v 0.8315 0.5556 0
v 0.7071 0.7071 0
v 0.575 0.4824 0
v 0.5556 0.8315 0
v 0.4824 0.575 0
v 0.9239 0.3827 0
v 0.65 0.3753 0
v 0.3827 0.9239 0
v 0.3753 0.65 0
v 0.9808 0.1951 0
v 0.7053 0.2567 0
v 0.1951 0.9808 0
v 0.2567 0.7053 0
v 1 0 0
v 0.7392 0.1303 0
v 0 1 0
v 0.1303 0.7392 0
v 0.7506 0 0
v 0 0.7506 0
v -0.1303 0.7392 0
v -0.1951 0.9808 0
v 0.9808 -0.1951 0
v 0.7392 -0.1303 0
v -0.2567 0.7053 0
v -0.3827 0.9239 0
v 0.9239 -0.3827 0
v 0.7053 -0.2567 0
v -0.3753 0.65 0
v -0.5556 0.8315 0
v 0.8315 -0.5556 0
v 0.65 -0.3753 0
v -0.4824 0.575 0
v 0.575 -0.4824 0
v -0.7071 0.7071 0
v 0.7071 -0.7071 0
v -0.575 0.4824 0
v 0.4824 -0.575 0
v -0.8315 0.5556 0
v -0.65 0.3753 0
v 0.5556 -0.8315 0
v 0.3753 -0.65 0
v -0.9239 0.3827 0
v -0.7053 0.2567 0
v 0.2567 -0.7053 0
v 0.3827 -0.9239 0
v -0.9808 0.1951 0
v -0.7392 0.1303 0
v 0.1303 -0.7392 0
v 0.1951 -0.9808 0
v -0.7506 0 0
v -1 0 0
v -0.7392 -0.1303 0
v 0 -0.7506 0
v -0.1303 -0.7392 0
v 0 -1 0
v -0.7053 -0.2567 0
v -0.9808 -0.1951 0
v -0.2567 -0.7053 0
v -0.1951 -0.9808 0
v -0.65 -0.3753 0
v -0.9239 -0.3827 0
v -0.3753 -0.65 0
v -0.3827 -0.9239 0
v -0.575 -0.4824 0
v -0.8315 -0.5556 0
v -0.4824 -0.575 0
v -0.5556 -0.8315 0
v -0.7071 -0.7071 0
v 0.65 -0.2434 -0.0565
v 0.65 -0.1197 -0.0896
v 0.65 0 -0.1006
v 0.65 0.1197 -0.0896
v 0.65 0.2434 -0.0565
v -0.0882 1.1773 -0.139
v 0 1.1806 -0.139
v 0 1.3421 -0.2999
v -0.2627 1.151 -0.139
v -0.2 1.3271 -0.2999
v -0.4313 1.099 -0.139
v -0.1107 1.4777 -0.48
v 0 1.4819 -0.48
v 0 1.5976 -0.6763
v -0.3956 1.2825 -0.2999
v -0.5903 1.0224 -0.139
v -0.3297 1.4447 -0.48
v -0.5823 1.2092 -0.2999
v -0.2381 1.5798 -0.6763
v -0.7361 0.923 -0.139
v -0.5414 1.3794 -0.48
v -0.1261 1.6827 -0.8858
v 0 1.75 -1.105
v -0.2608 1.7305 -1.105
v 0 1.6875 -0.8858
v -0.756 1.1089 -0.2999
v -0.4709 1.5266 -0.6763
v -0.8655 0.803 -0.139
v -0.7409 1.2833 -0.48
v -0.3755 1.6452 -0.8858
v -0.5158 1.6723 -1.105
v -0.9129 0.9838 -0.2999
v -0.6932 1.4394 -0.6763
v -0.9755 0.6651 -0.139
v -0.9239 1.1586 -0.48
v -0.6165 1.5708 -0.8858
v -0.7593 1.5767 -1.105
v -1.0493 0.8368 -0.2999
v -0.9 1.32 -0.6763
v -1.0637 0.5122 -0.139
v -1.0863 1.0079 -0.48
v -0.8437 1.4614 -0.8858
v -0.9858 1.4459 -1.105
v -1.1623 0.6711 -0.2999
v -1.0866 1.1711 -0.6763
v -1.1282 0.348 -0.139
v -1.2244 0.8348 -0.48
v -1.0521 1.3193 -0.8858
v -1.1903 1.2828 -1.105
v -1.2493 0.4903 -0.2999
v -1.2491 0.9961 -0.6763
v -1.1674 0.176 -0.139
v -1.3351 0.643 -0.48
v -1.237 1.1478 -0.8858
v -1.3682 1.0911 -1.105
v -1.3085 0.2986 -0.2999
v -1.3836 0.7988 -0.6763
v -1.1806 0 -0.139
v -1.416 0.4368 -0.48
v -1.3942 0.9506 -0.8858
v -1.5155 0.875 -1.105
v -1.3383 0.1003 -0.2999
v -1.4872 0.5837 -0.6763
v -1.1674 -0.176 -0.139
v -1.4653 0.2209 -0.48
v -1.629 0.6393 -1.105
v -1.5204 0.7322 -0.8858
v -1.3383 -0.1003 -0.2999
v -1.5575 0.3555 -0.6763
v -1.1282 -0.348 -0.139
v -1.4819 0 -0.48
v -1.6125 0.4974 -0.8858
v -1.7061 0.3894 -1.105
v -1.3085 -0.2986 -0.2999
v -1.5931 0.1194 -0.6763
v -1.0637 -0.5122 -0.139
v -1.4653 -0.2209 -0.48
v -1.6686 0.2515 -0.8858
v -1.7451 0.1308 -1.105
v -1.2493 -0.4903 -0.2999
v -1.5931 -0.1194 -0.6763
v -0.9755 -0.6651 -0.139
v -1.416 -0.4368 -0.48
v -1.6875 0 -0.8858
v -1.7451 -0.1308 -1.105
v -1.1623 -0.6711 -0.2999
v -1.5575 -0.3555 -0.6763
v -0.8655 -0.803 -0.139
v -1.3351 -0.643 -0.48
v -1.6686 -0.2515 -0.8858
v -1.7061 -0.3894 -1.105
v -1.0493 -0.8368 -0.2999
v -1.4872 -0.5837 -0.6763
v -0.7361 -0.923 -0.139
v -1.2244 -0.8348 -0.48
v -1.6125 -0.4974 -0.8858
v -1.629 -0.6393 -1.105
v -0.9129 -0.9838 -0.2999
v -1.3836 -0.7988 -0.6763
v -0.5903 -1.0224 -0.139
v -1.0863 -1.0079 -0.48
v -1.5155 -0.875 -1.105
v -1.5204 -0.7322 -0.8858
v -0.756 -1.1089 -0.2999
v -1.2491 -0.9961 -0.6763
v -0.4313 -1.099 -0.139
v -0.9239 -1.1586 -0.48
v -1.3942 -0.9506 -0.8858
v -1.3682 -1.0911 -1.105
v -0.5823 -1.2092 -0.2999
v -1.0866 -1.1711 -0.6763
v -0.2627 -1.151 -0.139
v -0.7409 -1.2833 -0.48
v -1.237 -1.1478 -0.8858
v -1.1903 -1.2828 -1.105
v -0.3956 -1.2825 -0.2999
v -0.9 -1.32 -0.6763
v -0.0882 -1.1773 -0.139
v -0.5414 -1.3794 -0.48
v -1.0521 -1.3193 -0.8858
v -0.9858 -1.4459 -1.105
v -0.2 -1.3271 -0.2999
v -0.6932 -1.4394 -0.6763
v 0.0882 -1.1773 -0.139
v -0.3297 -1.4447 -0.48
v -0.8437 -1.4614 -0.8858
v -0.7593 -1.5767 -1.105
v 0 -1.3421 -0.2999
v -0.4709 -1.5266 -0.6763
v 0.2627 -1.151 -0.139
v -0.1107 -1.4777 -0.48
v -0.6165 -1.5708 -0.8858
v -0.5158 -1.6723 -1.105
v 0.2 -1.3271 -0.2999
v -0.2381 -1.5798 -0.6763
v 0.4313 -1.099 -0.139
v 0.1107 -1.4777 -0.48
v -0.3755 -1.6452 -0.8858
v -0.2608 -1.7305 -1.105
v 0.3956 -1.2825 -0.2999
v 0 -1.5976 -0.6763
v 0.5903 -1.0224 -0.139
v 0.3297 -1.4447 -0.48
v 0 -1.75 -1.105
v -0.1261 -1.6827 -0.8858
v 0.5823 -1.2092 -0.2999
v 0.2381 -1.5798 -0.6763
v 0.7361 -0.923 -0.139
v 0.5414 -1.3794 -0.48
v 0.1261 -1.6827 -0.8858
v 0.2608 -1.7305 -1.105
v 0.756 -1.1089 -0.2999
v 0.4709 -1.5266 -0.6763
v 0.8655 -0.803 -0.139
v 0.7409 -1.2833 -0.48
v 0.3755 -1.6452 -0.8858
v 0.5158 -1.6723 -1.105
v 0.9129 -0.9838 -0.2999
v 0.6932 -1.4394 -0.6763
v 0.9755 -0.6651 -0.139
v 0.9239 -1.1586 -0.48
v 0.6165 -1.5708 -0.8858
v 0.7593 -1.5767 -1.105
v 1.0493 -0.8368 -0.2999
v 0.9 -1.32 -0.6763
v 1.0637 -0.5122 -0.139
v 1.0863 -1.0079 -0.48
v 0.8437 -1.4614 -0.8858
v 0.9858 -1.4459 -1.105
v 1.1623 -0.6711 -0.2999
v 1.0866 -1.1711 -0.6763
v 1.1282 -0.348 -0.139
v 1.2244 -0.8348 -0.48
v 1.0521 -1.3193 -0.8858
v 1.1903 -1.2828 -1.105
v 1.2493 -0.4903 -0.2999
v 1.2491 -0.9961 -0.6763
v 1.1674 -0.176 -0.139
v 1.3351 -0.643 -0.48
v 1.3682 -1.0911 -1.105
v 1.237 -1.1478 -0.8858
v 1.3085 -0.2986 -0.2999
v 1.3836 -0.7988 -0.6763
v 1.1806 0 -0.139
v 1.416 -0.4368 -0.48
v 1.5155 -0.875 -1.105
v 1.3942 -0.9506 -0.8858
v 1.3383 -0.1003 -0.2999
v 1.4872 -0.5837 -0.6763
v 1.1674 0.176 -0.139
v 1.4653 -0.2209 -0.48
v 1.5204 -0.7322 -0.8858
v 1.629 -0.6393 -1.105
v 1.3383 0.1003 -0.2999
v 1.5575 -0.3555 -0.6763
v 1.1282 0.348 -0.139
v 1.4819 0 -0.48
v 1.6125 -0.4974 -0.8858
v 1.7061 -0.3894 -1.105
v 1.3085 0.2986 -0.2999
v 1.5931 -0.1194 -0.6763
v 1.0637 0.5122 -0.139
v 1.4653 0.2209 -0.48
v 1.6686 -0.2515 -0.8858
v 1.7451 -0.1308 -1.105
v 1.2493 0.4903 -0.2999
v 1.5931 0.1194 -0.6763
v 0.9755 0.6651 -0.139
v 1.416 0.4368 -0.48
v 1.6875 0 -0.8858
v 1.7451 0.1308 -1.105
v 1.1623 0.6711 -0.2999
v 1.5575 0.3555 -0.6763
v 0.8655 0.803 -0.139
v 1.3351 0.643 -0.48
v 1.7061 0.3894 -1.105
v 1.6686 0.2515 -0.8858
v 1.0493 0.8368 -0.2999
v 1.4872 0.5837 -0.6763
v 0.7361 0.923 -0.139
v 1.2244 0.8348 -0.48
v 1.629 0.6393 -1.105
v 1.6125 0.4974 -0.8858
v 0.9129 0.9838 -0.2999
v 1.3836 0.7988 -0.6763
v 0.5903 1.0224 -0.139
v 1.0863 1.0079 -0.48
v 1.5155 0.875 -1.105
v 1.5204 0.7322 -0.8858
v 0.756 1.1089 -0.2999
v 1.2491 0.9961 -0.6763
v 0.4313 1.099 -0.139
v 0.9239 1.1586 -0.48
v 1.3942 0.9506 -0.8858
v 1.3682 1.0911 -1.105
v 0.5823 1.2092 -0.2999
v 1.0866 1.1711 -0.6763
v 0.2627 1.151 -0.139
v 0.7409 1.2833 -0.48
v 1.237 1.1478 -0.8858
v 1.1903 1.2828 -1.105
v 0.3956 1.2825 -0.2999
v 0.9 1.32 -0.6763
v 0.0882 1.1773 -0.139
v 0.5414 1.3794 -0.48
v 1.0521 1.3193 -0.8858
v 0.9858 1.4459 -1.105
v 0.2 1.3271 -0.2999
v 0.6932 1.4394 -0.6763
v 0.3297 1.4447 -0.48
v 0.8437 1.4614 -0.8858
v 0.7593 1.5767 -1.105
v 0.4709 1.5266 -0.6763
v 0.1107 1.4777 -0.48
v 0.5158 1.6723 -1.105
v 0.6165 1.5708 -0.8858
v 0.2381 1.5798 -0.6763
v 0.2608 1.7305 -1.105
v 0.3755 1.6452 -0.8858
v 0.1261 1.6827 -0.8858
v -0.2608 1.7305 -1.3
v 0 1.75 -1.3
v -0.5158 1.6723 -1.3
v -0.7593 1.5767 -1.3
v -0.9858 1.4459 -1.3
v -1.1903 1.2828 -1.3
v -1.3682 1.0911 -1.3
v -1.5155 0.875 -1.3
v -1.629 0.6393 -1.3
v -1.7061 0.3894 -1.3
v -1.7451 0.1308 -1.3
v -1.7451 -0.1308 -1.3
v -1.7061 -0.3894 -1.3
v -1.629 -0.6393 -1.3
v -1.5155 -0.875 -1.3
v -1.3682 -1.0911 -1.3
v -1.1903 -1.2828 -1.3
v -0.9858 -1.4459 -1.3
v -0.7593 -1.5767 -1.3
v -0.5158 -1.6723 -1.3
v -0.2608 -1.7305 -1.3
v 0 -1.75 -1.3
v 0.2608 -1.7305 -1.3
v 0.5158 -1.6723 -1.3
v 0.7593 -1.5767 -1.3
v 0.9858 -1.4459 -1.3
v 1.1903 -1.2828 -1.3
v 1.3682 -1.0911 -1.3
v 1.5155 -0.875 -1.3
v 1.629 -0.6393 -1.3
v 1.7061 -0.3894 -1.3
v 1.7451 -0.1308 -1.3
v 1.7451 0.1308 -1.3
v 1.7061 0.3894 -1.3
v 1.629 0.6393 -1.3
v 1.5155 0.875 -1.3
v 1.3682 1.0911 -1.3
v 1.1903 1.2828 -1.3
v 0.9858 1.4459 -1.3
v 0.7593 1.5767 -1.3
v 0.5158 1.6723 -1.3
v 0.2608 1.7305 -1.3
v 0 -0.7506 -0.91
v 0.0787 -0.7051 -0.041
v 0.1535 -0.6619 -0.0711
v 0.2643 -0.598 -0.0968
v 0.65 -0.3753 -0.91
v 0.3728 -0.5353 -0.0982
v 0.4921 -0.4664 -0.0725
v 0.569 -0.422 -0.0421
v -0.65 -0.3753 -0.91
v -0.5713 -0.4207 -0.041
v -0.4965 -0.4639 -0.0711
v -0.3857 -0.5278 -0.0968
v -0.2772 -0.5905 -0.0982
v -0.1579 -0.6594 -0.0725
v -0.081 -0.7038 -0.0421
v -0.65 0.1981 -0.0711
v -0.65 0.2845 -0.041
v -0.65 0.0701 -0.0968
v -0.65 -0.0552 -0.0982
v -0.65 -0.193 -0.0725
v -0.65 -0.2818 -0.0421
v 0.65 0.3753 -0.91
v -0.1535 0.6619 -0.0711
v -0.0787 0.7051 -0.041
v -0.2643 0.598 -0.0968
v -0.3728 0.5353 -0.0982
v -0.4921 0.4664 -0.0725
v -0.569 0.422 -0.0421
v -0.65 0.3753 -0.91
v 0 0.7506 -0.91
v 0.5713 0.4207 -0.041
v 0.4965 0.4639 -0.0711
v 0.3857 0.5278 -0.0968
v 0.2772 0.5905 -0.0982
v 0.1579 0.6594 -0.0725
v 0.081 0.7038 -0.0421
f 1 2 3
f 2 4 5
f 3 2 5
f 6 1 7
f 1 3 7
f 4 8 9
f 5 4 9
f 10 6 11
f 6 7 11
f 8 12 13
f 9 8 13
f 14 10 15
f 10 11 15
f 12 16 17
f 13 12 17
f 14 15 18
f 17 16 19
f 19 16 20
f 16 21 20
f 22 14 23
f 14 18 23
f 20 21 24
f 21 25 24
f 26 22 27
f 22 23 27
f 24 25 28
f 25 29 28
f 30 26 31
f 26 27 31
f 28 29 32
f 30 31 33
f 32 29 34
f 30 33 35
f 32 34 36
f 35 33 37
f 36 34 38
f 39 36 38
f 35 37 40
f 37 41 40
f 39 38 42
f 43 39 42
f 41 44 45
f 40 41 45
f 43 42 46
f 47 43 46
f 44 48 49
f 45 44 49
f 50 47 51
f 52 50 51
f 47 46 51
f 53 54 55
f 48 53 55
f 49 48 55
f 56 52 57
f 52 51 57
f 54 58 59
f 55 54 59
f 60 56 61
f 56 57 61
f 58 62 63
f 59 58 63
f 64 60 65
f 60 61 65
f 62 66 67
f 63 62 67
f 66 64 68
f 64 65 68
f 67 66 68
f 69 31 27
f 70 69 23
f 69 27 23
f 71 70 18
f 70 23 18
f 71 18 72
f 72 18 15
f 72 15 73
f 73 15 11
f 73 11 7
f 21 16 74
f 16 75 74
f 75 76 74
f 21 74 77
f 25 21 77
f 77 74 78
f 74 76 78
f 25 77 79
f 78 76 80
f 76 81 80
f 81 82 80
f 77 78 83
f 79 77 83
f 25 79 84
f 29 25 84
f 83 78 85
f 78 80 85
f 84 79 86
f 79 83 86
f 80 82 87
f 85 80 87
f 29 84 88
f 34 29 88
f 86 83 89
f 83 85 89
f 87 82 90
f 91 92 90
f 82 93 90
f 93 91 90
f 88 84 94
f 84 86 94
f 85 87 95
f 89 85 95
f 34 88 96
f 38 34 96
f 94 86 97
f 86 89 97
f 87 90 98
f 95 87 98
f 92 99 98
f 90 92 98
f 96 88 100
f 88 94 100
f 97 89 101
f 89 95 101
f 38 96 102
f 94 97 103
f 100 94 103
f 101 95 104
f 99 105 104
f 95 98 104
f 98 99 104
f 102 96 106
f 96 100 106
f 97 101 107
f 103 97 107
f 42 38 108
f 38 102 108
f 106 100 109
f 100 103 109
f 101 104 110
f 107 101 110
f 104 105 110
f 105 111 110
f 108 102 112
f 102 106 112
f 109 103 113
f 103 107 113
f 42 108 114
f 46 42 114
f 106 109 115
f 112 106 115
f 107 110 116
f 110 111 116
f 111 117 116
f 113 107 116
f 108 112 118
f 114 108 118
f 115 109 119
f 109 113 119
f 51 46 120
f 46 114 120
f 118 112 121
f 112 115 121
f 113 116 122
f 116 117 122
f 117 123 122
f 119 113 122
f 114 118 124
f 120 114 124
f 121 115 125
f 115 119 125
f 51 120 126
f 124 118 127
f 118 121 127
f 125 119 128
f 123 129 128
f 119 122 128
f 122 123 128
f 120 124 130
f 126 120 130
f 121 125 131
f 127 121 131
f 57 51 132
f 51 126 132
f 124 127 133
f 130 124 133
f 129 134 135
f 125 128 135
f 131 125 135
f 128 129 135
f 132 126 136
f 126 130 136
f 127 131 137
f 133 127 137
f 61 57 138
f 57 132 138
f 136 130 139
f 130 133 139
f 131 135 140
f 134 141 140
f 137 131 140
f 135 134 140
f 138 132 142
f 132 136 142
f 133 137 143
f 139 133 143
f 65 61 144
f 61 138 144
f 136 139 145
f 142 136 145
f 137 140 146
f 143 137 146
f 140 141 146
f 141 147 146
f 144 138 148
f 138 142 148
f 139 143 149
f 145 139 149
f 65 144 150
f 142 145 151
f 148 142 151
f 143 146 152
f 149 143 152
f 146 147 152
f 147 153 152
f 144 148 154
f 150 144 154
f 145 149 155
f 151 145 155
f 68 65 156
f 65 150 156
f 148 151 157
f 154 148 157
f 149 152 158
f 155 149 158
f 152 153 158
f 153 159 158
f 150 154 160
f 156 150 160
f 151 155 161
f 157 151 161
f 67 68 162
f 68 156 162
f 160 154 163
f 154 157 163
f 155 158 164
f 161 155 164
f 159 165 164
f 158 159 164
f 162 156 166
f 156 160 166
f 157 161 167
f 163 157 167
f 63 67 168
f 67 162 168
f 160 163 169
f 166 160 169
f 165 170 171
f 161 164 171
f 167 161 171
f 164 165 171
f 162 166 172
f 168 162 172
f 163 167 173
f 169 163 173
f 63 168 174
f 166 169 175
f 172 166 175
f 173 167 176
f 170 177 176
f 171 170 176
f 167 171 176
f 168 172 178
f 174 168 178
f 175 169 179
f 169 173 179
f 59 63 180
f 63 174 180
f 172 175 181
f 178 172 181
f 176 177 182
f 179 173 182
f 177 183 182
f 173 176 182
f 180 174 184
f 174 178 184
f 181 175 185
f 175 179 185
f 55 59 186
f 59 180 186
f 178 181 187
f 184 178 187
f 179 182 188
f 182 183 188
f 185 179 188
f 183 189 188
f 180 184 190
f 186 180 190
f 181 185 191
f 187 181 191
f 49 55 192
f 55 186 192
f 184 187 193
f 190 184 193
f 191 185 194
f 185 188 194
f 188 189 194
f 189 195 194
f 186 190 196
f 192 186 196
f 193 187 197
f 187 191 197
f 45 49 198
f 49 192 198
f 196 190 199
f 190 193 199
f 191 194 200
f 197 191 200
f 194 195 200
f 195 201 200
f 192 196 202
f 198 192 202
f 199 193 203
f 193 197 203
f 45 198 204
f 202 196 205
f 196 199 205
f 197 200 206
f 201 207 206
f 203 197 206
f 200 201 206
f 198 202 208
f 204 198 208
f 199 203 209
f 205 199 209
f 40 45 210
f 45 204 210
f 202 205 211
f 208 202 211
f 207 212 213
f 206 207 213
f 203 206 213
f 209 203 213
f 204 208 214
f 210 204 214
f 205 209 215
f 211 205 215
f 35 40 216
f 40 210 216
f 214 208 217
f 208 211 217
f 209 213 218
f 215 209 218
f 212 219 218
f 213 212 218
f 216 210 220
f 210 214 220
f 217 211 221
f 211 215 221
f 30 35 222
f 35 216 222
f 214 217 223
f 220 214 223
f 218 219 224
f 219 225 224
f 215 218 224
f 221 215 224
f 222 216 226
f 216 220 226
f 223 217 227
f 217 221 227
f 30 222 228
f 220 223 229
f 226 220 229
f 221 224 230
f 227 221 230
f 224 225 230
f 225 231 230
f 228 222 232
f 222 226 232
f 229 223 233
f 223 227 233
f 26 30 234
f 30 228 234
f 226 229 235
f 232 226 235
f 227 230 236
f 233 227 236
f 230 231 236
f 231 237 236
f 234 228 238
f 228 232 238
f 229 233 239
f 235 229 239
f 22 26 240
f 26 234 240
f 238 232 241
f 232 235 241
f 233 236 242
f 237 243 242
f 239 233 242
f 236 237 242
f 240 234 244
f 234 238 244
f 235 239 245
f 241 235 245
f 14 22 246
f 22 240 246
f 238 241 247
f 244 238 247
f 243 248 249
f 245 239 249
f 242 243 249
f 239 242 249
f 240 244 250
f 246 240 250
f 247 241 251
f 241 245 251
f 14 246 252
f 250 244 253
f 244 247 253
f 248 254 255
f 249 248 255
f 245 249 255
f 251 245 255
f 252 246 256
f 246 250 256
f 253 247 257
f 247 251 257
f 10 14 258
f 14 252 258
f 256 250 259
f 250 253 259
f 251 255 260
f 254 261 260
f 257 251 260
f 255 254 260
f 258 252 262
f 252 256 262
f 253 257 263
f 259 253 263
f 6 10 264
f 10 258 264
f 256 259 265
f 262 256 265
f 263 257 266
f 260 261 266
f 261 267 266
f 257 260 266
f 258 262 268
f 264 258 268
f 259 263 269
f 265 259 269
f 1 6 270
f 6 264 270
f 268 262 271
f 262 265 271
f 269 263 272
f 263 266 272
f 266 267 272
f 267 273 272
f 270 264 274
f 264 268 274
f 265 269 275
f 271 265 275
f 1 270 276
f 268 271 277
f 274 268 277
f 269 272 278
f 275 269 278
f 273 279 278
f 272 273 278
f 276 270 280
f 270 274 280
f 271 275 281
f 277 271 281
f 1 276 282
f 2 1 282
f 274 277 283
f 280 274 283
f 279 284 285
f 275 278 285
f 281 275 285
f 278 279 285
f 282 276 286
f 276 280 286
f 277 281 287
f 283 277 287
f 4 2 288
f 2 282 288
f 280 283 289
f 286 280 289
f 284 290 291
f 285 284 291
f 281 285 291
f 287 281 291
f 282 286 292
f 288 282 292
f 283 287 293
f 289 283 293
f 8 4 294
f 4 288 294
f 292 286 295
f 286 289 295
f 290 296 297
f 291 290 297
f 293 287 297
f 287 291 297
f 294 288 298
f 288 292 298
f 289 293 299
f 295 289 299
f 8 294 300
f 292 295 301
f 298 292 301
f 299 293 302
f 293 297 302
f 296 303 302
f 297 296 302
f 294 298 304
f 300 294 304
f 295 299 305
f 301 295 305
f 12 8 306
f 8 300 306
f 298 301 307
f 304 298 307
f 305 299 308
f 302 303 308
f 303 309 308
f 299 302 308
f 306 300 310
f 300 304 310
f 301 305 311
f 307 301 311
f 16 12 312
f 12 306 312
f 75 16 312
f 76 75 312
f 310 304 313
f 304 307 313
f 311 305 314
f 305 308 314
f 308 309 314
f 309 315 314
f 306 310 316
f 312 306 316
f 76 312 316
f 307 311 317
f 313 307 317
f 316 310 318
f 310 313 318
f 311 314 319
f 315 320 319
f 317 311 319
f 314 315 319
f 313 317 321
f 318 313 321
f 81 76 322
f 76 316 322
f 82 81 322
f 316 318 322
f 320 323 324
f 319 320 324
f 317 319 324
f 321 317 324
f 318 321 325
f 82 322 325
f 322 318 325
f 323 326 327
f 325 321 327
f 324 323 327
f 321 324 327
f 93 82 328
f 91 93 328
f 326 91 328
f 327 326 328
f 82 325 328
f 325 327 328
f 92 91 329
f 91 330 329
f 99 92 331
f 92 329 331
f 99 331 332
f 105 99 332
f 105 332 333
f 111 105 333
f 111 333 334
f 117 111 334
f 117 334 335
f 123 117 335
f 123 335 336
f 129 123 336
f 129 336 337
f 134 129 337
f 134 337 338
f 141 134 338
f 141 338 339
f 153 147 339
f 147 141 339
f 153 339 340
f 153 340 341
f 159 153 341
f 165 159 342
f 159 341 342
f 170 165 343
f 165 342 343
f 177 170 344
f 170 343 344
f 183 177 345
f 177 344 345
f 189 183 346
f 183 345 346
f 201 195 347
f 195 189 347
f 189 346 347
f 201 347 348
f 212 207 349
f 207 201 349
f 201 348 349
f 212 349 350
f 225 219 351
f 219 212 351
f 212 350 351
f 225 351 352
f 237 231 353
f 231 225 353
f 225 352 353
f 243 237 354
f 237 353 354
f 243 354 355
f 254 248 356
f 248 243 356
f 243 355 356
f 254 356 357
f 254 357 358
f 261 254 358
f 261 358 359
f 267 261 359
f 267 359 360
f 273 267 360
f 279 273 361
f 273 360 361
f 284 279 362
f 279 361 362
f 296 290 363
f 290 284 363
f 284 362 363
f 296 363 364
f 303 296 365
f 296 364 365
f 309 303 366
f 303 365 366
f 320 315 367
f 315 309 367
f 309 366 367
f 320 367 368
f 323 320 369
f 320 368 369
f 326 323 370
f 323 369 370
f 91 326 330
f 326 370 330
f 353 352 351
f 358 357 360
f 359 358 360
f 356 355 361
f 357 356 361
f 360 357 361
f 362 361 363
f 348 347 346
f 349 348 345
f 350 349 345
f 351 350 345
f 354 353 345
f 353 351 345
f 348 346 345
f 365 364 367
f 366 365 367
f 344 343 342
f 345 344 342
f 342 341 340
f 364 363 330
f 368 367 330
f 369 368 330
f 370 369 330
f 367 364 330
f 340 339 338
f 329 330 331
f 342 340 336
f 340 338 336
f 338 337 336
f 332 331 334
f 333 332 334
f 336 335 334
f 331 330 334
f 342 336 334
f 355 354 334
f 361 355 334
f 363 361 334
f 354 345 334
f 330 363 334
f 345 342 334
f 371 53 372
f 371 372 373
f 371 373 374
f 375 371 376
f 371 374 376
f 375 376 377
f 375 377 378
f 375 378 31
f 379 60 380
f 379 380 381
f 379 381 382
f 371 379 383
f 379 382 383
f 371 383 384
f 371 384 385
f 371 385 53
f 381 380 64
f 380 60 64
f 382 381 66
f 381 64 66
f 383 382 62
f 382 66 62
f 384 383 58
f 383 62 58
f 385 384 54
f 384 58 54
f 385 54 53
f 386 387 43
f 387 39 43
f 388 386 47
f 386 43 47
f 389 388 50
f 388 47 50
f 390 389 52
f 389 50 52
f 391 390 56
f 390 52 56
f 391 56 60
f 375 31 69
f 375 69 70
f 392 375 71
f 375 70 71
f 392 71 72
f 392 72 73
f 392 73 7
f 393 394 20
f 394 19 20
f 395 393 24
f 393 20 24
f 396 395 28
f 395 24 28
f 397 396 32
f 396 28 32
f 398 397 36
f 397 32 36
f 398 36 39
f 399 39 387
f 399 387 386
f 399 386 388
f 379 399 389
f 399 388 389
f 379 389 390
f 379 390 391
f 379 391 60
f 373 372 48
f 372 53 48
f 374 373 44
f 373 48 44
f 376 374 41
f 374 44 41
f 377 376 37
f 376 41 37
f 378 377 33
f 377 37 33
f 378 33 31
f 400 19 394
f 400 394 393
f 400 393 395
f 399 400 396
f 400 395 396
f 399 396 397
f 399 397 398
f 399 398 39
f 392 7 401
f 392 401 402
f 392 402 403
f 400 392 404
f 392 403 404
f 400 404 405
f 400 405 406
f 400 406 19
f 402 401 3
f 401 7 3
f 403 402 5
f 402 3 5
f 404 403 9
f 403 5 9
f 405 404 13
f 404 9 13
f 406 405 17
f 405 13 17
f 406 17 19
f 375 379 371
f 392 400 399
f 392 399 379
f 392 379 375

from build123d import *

# Parameters (mm, degrees)
REVOLVE2_ANGLE     = 360
CUT_EXTRUDE2_DEPTH = 0.91
SKETCH6_R          = 0.75055535
CUT_EXTRUDE3_DEPTH = 0.91
CUT_EXTRUDE3_DRAFT = -45


with BuildPart() as part:
    # Sketch7 → Revolve2 (revolve, symmetric)
    with BuildSketch(Plane(origin=(0, 0, 0), x_dir=(0, 0, -1), z_dir=(1, 0, 0))) as revolve2_sk:
        with BuildLine():
            Line((1.105, 1.75), (1.3, 1.75))
            Line((1.3, 1.75), (1.3, 0))
            Line((1.3, 0), (0, 0))
            Line((0, 0), (0, 1))
            ThreePointArc((0, 1), (0.479976957, 1.481850617), (1.105, 1.75))
        make_face()
    revolve(axis=Axis((0, 0, 0), (0, 0, -1)), revolution_arc=REVOLVE2_ANGLE / 2)
    revolve(revolve2_sk.sketch, axis=Axis((0, 0, 0), (0, 0, 1)), revolution_arc=REVOLVE2_ANGLE / 2)

    # Sketch5 → Cut-Extrude2 (cut)
    with BuildSketch(Plane.XY):
        Polygon((0.65, -0.375277675), (0.65, 0.375277675), (0, 0.75055535), (-0.65, 0.375277675), (-0.65, -0.375277675), (0, -0.75055535), align=None)
    extrude(amount=-CUT_EXTRUDE2_DEPTH, mode=Mode.SUBTRACT)


with BuildPart() as cut_extrude3_tool:
    # Sketch6 → Cut-Extrude3 (with draft: the straight prism first)
    with BuildSketch(Plane.XY):
        Circle(SKETCH6_R)
    extrude(amount=-CUT_EXTRUDE3_DEPTH)
    # Cut-Extrude3: the draft: its side faces are tilted about the plane it starts from
    cut_extrude3_sides = [cut_extrude3_tool.faces().sort_by_distance(p)[0] for p in [
        (-0.75055535, 0, -0.455),
    ]]
    draft(cut_extrude3_sides, Plane.XY, CUT_EXTRUDE3_DRAFT)


with BuildPart() as part_1:
    add(part.part)

    # Cut-Extrude3: cut by cut_extrude3_tool
    add(cut_extrude3_tool.part, mode=Mode.SUBTRACT)


solid = part_1.part
